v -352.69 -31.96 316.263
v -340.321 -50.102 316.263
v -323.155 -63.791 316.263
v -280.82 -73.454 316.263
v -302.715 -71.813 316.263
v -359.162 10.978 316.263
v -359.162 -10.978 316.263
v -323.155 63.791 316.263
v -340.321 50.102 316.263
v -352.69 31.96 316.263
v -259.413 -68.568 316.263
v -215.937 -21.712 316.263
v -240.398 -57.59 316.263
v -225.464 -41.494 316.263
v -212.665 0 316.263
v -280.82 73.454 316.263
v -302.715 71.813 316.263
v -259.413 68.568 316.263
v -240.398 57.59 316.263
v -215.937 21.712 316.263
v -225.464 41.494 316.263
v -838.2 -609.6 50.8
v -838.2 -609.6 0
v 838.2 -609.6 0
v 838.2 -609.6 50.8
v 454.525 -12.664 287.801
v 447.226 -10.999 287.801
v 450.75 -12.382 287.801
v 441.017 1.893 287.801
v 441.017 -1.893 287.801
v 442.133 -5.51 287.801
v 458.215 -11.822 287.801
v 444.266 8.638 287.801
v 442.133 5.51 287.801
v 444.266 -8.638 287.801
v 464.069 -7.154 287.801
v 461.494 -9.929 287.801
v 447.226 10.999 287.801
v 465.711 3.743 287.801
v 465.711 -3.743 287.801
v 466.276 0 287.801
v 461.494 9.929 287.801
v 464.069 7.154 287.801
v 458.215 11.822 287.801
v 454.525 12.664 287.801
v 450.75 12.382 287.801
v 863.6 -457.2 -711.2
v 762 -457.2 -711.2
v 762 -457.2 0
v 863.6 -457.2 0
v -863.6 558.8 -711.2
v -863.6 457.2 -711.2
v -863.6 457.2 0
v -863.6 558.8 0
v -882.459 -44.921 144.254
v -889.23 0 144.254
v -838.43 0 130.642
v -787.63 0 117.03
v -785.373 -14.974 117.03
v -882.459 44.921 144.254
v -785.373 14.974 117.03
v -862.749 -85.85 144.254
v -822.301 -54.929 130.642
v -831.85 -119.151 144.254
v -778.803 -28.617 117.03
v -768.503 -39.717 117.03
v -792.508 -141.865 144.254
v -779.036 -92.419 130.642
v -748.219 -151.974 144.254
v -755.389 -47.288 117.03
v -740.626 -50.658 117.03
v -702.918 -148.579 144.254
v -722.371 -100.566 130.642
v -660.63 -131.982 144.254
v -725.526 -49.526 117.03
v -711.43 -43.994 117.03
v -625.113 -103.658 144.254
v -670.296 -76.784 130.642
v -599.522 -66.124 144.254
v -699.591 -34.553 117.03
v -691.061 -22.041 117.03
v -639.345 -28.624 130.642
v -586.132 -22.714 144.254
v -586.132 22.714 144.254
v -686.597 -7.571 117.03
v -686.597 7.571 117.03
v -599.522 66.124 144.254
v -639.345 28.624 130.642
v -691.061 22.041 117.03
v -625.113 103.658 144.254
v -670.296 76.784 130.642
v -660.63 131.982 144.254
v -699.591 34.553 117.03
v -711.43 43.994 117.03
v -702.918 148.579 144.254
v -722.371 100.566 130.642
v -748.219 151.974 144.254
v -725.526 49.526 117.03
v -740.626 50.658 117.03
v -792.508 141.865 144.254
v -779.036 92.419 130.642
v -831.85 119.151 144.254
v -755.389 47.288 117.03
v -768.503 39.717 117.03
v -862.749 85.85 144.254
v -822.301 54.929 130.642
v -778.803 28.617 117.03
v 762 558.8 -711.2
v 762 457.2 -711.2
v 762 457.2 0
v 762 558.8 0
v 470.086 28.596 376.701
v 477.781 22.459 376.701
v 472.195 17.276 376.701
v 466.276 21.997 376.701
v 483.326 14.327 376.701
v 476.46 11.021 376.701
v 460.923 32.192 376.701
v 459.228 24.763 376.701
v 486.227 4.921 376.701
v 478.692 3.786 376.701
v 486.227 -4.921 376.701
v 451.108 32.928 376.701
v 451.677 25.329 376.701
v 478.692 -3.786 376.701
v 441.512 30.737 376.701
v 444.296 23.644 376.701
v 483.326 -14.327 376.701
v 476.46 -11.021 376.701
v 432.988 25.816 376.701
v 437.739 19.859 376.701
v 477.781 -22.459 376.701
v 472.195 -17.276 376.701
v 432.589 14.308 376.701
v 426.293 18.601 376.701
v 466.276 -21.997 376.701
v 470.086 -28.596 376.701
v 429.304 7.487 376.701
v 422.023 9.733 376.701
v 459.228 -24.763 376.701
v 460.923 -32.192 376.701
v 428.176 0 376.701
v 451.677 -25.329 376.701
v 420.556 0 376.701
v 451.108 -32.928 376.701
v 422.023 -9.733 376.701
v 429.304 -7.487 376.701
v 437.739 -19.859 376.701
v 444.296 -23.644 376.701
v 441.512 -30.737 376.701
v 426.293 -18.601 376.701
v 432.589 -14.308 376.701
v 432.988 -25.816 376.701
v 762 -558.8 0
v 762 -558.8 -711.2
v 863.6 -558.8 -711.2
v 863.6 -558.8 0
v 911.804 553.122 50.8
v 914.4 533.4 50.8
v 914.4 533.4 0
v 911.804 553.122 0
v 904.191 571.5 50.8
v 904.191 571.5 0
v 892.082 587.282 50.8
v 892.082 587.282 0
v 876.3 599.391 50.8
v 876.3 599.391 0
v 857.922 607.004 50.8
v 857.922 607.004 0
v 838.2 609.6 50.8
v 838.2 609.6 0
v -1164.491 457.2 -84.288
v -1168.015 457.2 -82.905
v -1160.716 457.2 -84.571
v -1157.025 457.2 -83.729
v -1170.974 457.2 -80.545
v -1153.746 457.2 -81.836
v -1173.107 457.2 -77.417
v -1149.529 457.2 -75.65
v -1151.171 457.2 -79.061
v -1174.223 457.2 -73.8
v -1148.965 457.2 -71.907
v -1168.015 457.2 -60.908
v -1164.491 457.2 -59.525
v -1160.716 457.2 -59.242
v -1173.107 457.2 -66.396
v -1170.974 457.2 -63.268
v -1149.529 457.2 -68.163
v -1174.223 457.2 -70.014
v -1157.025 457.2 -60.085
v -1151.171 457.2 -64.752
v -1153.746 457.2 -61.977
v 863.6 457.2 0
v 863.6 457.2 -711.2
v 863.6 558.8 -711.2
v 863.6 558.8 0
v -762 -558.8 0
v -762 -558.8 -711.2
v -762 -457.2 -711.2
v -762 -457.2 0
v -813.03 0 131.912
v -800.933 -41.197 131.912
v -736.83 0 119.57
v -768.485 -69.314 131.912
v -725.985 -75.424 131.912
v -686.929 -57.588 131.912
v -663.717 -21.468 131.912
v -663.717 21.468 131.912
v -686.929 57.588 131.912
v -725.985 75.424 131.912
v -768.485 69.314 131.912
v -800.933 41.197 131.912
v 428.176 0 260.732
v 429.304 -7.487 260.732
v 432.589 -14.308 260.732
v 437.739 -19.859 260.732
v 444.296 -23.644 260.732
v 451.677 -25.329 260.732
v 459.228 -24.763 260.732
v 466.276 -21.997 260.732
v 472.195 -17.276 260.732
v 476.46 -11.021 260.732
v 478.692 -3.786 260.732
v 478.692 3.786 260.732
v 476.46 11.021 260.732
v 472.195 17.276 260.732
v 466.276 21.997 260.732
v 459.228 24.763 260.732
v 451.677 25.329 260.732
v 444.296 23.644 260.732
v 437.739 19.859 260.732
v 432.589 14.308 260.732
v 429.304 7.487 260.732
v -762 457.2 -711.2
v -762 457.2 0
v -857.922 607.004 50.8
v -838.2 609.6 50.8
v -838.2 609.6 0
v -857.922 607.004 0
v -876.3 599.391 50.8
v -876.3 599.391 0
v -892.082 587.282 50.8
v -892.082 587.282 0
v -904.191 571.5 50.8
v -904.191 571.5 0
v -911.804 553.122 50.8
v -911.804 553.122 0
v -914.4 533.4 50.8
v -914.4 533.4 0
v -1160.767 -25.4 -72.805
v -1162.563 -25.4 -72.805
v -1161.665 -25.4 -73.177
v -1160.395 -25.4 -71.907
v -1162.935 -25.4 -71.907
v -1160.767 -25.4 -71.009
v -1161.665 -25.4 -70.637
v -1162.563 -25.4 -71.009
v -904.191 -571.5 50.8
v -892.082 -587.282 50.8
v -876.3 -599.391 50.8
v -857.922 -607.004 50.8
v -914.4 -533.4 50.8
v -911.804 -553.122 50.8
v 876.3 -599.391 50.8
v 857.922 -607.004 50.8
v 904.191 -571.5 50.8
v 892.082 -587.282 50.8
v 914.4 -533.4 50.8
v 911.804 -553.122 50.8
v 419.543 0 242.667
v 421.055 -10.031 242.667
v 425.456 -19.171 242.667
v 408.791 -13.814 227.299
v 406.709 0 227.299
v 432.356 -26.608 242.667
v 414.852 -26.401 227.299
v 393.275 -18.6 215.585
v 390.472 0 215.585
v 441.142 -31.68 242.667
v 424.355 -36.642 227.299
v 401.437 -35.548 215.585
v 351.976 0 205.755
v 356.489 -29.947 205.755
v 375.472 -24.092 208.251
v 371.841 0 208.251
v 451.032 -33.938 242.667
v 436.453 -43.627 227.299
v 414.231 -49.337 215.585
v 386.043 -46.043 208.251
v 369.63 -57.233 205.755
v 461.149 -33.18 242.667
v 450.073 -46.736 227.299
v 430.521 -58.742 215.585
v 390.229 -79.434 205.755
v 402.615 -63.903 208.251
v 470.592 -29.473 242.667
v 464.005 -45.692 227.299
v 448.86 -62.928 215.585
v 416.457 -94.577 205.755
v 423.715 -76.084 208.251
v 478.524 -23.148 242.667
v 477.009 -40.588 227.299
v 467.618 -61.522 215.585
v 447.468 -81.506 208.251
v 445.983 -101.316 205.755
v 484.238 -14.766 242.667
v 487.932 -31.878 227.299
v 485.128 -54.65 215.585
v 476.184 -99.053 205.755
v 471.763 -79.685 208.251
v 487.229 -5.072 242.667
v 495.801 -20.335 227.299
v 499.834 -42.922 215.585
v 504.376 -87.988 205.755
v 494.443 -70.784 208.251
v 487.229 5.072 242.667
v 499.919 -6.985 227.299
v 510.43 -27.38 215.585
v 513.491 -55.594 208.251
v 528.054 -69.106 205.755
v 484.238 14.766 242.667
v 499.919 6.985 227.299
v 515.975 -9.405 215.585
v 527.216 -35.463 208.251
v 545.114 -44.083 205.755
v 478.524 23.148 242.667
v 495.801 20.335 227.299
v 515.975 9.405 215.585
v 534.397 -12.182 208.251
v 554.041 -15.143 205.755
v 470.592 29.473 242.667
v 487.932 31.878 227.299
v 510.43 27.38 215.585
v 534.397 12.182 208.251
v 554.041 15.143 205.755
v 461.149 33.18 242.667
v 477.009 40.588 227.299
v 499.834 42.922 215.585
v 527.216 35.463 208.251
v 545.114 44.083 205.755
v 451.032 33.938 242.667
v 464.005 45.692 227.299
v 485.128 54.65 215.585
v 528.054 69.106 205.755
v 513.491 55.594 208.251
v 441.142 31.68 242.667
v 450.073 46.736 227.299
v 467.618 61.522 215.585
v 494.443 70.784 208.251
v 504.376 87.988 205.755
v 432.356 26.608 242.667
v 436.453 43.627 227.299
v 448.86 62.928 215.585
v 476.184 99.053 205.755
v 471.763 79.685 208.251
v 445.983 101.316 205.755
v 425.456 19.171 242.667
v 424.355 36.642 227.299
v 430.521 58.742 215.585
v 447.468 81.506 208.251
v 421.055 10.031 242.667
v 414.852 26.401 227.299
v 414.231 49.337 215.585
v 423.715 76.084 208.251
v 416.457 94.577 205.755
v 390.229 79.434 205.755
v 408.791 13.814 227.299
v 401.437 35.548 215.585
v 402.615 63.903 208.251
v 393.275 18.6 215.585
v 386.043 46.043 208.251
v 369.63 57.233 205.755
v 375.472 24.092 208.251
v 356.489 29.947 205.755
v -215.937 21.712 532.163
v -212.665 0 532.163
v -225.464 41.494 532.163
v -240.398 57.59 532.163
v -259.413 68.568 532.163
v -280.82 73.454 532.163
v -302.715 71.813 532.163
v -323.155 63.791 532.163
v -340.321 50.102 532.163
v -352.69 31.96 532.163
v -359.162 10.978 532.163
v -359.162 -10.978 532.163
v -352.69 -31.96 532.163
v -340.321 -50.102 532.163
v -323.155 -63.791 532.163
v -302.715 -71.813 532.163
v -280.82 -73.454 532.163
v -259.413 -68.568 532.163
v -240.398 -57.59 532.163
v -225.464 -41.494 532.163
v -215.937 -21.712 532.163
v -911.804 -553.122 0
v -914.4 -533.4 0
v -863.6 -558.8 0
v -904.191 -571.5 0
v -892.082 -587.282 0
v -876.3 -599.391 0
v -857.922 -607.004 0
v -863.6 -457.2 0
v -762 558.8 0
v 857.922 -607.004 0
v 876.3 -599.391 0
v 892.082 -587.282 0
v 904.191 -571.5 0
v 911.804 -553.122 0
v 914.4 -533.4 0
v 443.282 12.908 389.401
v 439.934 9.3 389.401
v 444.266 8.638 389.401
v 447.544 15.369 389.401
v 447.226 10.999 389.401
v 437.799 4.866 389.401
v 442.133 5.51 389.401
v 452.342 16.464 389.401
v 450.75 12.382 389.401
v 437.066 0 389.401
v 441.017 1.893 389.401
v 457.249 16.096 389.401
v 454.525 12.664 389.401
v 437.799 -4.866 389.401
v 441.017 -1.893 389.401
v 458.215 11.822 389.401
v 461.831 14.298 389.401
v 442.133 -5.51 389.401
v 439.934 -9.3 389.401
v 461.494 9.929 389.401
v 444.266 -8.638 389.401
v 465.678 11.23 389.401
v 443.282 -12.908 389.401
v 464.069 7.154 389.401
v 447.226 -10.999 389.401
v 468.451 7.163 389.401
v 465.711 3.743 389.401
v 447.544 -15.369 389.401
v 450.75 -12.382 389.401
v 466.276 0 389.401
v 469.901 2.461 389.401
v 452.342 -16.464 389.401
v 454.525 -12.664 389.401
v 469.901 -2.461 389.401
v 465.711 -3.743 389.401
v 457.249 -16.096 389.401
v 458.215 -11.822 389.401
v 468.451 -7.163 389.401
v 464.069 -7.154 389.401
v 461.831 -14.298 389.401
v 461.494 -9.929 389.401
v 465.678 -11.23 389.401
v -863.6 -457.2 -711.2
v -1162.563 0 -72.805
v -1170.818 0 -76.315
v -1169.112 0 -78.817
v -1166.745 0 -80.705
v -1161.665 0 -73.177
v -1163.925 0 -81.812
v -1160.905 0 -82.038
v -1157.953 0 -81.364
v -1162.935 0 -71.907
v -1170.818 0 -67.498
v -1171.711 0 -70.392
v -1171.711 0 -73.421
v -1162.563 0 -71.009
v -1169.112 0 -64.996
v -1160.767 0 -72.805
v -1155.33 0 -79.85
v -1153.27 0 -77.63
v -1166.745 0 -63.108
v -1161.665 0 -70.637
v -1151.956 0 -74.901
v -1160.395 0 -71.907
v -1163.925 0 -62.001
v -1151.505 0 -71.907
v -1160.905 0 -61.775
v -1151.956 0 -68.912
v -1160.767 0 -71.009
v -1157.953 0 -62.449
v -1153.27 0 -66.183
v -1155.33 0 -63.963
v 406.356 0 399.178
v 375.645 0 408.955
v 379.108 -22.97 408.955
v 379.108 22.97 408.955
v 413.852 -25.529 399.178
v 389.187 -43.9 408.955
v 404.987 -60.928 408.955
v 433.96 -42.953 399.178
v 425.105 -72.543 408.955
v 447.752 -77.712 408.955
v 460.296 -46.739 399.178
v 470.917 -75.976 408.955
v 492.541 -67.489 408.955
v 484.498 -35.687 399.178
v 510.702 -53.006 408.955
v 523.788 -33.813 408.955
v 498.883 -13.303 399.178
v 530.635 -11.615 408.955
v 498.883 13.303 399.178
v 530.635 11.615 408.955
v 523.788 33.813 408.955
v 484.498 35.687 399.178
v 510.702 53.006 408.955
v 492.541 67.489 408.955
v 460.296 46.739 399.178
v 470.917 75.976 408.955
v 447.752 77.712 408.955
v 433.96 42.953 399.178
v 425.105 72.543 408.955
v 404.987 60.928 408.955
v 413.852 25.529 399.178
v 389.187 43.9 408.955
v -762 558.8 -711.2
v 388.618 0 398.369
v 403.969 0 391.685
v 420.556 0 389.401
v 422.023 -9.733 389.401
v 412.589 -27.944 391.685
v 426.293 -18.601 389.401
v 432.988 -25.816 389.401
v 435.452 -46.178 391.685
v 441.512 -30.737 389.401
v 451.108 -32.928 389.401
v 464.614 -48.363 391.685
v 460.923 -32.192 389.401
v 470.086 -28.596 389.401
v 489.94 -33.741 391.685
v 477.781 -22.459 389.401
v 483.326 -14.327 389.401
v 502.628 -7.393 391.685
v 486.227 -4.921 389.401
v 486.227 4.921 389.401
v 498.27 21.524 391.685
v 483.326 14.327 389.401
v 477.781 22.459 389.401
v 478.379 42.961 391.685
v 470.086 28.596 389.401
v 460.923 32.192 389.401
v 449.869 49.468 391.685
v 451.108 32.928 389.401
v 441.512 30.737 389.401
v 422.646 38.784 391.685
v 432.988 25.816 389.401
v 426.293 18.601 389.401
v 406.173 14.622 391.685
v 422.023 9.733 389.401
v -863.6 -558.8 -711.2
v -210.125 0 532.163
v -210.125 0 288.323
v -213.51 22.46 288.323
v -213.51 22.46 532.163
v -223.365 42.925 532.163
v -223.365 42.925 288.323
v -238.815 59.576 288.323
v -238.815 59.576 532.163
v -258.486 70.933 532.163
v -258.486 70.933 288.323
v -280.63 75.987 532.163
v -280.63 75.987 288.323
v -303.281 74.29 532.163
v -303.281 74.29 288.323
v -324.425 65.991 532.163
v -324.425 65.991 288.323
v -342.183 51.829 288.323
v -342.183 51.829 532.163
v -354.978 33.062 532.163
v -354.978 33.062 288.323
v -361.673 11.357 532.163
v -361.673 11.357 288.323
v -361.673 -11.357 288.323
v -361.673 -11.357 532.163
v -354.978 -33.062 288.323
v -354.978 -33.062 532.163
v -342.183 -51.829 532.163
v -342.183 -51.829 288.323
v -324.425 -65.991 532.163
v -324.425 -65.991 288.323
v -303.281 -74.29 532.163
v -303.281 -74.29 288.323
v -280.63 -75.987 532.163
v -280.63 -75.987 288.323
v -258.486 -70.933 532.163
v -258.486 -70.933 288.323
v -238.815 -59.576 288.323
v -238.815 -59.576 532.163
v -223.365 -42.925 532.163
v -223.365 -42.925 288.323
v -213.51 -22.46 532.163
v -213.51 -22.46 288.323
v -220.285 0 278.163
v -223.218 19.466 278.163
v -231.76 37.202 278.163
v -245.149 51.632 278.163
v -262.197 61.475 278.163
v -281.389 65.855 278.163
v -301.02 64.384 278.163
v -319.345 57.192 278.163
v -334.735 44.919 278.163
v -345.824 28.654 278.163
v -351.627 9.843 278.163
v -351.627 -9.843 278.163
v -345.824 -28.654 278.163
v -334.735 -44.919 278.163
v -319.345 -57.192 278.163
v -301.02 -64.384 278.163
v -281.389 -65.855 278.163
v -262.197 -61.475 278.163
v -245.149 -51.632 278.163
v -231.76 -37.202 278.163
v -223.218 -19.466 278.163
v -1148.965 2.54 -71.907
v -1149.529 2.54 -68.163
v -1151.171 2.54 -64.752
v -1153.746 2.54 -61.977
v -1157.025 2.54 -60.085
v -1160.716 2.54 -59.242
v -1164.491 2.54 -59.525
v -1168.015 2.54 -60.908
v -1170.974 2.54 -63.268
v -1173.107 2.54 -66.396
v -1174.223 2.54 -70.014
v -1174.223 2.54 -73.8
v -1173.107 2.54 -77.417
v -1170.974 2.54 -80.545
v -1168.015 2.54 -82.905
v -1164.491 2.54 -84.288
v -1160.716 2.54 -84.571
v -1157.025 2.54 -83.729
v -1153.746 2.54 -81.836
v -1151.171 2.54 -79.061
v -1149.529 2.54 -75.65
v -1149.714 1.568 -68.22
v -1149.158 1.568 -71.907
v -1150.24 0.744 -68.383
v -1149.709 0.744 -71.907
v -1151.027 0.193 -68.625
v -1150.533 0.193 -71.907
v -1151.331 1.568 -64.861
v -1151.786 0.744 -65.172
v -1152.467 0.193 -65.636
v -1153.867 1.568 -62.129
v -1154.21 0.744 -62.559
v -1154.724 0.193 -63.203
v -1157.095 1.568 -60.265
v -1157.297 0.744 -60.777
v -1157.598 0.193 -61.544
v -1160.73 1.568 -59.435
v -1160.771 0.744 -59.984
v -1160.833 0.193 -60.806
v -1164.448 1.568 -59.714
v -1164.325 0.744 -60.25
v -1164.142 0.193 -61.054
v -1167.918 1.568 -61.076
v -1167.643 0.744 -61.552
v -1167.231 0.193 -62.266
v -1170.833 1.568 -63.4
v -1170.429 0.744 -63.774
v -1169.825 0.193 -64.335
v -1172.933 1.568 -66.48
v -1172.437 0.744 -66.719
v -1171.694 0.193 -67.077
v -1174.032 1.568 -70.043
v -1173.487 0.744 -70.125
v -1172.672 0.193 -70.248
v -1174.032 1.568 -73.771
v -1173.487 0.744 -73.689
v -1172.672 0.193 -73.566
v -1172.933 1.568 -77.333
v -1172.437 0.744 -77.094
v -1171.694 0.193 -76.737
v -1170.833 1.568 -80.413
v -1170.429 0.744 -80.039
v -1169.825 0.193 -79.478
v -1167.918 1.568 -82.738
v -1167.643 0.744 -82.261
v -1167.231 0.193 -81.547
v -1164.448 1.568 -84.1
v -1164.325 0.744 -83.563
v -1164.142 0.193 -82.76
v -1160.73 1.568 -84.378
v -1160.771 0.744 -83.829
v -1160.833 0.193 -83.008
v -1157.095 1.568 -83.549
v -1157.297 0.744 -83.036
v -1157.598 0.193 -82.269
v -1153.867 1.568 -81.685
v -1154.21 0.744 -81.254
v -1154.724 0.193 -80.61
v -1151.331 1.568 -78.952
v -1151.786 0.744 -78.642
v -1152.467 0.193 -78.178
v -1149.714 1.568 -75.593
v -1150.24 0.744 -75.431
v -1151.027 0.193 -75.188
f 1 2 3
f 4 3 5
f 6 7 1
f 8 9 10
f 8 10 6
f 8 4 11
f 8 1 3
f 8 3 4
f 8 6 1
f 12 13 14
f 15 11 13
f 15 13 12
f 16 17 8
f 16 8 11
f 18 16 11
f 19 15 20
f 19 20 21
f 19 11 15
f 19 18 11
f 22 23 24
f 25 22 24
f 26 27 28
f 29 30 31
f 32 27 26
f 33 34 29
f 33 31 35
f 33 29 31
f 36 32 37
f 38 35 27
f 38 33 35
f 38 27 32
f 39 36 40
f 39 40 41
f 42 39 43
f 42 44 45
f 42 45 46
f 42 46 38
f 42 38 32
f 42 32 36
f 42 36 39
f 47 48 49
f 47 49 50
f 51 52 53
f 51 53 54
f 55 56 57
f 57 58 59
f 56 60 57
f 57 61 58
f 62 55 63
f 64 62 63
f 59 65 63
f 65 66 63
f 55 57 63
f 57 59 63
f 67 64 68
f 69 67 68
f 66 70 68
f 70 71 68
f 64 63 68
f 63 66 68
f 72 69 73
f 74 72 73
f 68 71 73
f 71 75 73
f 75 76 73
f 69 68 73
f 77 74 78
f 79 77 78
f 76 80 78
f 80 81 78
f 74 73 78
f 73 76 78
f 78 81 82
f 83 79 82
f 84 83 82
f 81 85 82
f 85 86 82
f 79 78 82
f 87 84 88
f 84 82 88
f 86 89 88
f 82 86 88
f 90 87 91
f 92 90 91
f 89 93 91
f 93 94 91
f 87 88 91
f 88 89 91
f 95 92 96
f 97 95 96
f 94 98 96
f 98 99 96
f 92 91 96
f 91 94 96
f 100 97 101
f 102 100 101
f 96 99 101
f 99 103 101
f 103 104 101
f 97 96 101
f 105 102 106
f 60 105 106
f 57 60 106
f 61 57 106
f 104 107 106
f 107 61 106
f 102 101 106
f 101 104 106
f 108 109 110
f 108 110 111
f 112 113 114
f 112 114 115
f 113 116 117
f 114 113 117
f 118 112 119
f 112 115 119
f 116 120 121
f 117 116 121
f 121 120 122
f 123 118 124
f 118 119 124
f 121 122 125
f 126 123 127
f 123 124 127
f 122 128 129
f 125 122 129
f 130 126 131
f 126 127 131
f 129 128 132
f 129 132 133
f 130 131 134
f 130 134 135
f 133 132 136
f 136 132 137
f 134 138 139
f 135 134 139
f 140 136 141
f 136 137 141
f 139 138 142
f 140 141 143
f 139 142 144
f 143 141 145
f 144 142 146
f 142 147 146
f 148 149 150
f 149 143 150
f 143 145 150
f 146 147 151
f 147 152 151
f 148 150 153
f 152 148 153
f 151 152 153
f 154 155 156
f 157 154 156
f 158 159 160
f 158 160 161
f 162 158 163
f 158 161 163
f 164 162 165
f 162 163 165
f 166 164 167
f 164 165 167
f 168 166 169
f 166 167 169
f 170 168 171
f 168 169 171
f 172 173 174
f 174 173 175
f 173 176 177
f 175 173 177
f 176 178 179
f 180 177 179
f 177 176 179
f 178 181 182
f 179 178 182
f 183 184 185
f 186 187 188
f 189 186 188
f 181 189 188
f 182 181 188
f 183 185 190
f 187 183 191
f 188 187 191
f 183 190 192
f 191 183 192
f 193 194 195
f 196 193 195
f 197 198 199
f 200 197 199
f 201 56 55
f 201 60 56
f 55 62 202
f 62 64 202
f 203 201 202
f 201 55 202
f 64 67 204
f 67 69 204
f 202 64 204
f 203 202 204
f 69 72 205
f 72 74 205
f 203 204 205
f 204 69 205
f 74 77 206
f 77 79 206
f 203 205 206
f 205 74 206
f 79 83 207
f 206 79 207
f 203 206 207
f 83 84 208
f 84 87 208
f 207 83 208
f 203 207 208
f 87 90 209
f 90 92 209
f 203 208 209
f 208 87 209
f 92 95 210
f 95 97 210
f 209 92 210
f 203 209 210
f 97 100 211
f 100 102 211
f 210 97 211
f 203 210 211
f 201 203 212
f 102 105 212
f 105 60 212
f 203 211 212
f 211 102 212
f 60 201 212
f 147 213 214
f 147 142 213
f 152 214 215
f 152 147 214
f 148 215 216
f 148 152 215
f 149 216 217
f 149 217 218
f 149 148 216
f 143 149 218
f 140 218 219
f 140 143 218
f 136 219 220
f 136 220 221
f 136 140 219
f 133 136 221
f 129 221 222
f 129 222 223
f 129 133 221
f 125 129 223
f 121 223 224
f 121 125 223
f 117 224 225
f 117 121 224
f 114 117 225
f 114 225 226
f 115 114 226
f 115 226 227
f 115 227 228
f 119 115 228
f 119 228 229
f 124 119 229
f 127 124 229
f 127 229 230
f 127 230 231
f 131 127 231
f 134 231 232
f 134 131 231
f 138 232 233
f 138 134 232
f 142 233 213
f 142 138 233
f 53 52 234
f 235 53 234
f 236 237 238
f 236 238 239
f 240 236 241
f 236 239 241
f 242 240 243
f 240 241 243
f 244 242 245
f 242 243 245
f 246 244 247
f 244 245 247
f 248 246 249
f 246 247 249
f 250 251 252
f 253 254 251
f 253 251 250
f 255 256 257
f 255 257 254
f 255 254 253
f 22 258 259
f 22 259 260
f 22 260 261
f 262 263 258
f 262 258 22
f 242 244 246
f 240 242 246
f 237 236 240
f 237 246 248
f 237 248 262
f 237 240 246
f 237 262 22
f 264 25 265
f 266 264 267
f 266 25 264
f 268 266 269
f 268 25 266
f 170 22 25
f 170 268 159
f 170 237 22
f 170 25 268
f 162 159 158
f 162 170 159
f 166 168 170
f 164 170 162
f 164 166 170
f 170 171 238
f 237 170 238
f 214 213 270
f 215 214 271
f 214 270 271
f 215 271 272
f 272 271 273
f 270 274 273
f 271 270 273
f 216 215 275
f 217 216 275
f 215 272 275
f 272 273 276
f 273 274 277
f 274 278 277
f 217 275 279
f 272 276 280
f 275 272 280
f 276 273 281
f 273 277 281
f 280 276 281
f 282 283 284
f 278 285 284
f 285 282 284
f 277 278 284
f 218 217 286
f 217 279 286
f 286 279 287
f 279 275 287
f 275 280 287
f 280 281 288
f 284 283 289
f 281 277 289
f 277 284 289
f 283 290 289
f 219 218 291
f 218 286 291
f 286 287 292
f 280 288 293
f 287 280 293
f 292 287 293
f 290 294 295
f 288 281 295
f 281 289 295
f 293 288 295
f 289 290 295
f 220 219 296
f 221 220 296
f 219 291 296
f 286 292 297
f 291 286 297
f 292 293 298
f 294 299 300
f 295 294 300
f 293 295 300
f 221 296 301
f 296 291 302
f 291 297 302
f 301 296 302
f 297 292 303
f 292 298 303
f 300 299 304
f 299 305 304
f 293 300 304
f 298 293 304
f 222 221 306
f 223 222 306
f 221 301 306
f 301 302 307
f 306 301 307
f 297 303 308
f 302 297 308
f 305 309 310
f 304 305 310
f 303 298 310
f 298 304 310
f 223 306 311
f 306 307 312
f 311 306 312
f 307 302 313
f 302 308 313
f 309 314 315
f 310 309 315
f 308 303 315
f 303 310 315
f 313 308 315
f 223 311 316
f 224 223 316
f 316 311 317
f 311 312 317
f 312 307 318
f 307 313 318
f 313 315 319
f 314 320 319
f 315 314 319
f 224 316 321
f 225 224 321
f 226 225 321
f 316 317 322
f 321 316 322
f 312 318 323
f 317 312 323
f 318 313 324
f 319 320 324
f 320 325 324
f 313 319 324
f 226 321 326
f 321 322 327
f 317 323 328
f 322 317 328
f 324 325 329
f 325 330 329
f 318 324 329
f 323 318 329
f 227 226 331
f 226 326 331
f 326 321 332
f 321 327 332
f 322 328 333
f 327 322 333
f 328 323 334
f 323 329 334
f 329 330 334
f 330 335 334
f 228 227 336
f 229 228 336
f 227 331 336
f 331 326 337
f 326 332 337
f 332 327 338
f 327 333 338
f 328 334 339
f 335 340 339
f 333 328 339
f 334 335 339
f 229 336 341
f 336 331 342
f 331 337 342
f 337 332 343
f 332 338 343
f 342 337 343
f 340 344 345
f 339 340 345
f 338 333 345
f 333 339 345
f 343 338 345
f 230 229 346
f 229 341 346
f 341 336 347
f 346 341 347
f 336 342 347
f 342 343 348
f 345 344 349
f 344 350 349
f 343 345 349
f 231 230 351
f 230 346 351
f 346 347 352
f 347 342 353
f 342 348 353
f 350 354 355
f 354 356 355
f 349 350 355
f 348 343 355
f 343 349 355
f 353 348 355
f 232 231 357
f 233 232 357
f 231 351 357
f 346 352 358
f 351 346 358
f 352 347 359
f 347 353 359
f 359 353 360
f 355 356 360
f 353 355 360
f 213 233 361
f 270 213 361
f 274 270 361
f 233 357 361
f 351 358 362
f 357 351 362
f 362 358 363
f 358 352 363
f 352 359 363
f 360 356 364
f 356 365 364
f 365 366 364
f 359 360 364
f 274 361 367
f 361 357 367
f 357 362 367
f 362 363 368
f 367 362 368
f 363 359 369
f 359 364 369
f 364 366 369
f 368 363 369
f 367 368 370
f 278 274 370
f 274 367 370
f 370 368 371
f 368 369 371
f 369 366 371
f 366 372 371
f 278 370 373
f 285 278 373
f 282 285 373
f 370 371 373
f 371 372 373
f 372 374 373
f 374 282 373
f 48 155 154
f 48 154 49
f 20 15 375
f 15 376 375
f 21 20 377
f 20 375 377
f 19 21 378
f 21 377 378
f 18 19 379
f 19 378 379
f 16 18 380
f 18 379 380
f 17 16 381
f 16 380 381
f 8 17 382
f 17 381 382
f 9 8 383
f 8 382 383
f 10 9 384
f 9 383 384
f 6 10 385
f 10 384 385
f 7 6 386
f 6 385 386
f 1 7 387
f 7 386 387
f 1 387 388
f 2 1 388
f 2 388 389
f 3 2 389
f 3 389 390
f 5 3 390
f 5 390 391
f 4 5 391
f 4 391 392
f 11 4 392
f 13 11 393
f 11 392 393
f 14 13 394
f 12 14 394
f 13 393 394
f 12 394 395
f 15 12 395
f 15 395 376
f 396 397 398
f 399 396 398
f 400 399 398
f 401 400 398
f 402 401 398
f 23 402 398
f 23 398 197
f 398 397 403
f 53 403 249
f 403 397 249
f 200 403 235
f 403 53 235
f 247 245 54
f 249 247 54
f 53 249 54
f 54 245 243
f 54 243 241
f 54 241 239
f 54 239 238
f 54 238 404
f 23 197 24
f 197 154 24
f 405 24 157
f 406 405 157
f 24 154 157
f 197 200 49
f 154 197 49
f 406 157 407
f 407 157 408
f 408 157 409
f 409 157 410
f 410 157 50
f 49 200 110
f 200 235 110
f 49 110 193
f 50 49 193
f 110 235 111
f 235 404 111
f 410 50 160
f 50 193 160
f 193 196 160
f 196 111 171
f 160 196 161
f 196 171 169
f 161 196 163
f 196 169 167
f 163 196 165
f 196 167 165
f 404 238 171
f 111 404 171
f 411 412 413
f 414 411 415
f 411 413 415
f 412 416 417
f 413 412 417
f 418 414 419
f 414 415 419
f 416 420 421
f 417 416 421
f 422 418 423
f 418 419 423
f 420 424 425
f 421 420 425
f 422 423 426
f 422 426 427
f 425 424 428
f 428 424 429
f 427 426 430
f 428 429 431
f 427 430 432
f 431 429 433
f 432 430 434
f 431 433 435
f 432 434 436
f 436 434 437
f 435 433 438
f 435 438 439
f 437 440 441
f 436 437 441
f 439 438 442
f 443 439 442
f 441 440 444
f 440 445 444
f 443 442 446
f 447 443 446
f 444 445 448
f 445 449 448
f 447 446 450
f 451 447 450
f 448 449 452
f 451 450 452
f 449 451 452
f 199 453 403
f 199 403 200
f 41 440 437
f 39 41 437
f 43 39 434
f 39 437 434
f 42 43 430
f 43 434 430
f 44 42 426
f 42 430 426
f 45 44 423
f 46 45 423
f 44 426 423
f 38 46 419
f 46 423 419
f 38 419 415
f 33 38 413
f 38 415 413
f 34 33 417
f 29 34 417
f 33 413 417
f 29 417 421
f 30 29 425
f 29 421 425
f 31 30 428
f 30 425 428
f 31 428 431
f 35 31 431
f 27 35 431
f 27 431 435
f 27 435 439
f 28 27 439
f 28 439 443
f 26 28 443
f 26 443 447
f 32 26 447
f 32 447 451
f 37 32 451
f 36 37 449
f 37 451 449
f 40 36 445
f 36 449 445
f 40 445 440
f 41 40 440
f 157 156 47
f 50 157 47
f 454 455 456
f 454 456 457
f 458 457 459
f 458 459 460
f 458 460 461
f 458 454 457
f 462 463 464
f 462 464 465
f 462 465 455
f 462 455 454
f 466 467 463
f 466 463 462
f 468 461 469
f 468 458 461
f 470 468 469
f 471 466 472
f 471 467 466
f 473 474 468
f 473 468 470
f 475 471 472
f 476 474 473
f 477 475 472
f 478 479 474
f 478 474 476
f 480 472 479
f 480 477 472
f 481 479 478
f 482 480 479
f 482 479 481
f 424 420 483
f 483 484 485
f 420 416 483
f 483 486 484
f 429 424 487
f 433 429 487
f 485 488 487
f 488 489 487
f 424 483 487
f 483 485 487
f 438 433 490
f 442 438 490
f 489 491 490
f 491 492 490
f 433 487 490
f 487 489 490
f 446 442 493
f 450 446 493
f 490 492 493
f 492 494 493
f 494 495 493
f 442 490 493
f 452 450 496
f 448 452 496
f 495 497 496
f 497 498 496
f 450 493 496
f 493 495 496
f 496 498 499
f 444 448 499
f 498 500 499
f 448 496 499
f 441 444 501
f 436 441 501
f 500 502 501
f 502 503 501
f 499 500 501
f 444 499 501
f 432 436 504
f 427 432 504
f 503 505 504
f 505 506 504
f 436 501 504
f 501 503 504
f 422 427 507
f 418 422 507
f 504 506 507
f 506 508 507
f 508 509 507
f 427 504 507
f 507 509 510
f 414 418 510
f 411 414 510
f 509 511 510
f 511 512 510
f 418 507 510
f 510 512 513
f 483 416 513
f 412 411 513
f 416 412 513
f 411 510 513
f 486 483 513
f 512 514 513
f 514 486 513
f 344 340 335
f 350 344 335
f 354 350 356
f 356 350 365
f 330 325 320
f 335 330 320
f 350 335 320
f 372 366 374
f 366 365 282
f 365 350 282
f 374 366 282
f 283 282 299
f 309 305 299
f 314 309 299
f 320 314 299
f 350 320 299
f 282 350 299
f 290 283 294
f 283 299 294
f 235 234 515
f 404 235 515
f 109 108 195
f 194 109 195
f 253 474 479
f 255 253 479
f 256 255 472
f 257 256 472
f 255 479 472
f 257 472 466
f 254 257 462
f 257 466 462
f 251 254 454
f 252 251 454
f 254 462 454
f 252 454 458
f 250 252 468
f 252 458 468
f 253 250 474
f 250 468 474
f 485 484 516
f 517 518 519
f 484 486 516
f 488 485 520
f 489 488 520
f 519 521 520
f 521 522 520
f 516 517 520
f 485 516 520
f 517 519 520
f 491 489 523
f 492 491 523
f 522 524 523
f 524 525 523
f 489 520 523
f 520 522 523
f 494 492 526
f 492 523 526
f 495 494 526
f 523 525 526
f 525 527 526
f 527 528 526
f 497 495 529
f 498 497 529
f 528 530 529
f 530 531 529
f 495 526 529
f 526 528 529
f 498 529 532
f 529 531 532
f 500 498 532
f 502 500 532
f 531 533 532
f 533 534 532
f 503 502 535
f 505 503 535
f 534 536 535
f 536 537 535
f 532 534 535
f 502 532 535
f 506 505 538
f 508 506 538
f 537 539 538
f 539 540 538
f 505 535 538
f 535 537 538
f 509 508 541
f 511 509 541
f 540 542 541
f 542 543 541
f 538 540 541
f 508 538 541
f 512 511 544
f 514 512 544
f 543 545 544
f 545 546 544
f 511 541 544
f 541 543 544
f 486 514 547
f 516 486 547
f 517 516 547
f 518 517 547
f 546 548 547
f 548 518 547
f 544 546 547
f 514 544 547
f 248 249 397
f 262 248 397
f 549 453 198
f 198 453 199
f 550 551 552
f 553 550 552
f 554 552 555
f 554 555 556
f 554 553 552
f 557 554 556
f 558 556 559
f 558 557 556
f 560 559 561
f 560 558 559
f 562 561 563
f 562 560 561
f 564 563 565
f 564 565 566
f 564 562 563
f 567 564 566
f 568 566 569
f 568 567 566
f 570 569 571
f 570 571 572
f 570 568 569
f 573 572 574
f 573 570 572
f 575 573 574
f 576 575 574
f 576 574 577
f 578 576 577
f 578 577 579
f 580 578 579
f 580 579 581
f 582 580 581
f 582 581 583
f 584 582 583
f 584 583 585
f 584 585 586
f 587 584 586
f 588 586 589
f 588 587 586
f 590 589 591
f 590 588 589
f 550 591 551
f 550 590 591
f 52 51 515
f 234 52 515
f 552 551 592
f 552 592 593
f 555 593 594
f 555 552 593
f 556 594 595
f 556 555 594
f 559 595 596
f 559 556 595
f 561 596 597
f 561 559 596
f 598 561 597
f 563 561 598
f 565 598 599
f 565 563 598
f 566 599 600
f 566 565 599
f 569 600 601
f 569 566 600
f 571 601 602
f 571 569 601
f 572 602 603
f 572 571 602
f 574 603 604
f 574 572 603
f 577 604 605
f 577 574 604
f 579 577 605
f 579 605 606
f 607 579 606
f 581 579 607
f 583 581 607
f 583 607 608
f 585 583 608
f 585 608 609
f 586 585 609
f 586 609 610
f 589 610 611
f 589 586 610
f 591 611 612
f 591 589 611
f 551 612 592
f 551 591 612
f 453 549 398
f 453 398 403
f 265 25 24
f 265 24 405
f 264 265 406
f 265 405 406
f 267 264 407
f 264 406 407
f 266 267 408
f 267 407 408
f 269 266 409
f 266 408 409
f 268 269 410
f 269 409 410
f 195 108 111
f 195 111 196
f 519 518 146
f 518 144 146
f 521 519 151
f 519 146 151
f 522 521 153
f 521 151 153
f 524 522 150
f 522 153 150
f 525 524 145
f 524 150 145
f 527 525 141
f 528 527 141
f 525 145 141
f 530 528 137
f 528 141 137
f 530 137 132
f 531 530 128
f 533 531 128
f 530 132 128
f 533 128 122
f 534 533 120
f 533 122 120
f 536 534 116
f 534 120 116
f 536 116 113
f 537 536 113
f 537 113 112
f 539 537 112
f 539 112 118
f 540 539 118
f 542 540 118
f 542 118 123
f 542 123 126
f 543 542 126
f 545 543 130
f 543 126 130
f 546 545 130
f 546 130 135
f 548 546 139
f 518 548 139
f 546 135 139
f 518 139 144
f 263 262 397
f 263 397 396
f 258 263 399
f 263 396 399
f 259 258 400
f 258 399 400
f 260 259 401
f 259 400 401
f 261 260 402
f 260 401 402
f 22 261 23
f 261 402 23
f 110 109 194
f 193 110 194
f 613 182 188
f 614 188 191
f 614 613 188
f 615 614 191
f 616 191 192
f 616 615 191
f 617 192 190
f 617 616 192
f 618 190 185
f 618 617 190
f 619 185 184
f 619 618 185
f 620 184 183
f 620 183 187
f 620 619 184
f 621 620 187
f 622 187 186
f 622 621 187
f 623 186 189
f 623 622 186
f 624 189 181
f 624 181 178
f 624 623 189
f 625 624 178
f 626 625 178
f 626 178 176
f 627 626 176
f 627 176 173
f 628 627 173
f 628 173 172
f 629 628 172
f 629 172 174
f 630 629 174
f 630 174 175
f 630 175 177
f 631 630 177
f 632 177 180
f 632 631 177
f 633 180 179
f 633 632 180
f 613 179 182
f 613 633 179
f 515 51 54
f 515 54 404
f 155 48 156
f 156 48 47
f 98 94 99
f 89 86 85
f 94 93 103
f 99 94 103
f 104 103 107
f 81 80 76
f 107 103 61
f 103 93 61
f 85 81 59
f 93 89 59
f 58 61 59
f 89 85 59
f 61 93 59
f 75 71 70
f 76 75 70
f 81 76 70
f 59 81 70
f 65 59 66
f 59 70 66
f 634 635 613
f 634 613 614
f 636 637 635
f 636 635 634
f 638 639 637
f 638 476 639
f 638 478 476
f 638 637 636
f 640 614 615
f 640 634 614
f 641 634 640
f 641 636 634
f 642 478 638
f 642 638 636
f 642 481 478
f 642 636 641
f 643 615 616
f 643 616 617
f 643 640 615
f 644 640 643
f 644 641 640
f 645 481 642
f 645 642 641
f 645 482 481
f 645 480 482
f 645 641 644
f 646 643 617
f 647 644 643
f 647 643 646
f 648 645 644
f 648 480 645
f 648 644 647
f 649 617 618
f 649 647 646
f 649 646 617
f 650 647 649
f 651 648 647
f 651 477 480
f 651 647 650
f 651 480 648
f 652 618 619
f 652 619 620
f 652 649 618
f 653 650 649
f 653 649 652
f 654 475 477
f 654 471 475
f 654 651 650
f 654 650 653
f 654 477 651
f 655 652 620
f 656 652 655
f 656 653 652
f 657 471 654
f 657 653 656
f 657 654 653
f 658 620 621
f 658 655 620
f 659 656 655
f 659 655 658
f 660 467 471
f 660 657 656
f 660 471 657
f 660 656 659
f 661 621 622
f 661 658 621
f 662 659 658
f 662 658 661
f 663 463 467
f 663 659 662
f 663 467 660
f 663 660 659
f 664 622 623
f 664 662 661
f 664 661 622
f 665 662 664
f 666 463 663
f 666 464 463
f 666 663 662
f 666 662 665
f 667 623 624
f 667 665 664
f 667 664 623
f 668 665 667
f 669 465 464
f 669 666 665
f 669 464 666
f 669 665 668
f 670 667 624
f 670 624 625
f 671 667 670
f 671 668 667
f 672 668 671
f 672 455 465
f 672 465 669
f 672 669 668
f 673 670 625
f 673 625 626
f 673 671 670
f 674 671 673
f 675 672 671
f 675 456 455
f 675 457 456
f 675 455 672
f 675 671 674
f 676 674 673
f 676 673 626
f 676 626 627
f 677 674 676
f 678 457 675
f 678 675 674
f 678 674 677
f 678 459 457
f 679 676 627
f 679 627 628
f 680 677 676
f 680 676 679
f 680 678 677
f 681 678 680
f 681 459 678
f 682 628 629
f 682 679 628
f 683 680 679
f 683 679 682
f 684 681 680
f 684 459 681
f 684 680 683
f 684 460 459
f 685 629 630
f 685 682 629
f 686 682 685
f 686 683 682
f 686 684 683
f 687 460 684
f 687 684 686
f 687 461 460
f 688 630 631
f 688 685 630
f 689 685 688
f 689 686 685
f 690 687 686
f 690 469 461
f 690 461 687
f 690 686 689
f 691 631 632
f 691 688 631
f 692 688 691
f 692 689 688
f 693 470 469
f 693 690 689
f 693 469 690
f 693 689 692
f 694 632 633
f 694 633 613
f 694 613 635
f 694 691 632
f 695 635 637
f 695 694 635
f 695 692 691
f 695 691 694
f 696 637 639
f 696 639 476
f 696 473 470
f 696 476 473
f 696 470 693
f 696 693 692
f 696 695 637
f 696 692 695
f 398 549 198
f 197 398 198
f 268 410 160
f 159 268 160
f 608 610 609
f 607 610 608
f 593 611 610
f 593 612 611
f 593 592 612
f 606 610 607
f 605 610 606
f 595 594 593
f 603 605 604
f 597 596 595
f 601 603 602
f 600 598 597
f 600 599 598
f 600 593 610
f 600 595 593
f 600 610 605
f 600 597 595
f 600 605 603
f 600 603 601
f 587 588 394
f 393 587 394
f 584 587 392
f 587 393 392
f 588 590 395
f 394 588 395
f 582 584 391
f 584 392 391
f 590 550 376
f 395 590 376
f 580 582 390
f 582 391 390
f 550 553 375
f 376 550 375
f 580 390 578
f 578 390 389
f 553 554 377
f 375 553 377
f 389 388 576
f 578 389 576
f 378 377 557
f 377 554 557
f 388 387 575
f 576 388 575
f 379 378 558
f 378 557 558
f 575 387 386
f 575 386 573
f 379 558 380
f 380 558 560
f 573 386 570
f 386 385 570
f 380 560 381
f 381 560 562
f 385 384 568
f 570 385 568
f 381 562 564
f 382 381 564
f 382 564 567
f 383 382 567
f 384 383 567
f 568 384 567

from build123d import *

# Parameters (mm, degrees)
F0_W      = 101.6
F0_H      = 101.6
F1_DEPTH  = 50.8
F2_DEPTH  = 711.2
F3_W      = 2.54
F3_H      = 215.9
F5_SIZE   = 10.16
F8_R      = 12.7
F8_R_2    = 1.27
F9_DEPTH  = 457.2
F10_DEPTH = 25.4
F11_R     = 2.54
F12_W     = 25.4
F12_H     = 115.9687861614
F14_R     = 12.7
F15_DEPTH = 101.6


with BuildPart() as f1:
    # F0 (on Top) → F1 (new body)
    with BuildSketch(Plane.XY):
        with BuildLine():
            Line((838.2, 609.6), (-838.2, 609.6))
            ThreePointArc((-838.2, 609.6), (-892.0815367264, 587.2815367264), (-914.4, 533.4))
            Line((-914.4, 533.4), (-914.4, -533.4))
            ThreePointArc((-914.4, -533.4), (-892.0815367264, -587.2815367264), (-838.2, -609.6))
            Line((-838.2, -609.6), (838.2, -609.6))
            ThreePointArc((838.2, -609.6), (892.0815367264, -587.2815367264), (914.4, -533.4))
            Line((914.4, -533.4), (914.4, 533.4))
            ThreePointArc((914.4, 533.4), (892.0815367264, 587.2815367264), (838.2, 609.6))
        make_face()
        with Locations((-812.8, -508)):
            Rectangle(F0_W, F0_H, mode=Mode.SUBTRACT)
        with Locations((812.8, -508)):
            Rectangle(F0_W, F0_H, mode=Mode.SUBTRACT)
        with Locations((-812.8, 508)):
            Rectangle(F0_W, F0_H, mode=Mode.SUBTRACT)
        with Locations((812.8, 508)):
            Rectangle(F0_W, F0_H, mode=Mode.SUBTRACT)
        with Locations((-812.8, -508)):
            Rectangle(F0_W, F0_H)
        with Locations((812.8, -508)):
            Rectangle(F0_W, F0_H)
        with Locations((812.8, 508)):
            Rectangle(F0_W, F0_H)
        with Locations((-812.8, 508)):
            Rectangle(F0_W, F0_H)
    extrude(amount=F1_DEPTH)

    # F0 (on Top) → F2 (join)
    with BuildSketch(Plane.XY):
        with Locations((-812.8, -508)):
            Rectangle(F0_W, F0_H)
        with Locations((-812.8, 508)):
            Rectangle(F0_W, F0_H)
        with Locations((812.8, 508)):
            Rectangle(F0_W, F0_H)
        with Locations((812.8, -508)):
            Rectangle(F0_W, F0_H)
    extrude(amount=-F2_DEPTH)


with BuildPart() as f4:
    # F3 (on Front) → F4 (revolve)
    with BuildSketch(Plane.XZ):
        Polygon((-286.3245010376, 316.2632285118), (-286.3245010376, 278.1632285118), (-210.1245010376, 278.1632285118), (-210.1245010376, 316.2632285118), (-212.6645010376, 316.2632285118), align=None)
        with Locations((-211.3945010376, 424.2132285118)):
            Rectangle(F3_W, F3_H)
    revolve(axis=Axis((-286.3245010376, 0, 405.1632285118), (0, 0, 1)))

    # F5
    f5_edges = [f4.edges().sort_by_distance(p)[0] for p in [
        (-362.524501, 0, 278.163229),
    ]]
    chamfer(f5_edges, length=F5_SIZE)


with BuildPart() as f7:
    # F6 (on Front) → F7 (revolve)
    with BuildSketch(Plane.XZ):
        Polygon((-787.6298852921, 117.0304474873), (-736.8298852921, 117.0304474873), (-736.8298852921, 119.5704474873), (-889.2298852921, 144.2540854383), align=None)
    revolve(axis=Axis((-736.8298852921, 0, 187.9355122422), (0, 0, 1)))


with BuildPart() as f9:
    # F8 (on Front) → F9 (new body)
    with BuildSketch(Plane.XZ):
        with Locations((-1161.6646051407, -71.9066634774)):
            Circle(F8_R)
        with Locations((-1161.6646051407, -71.9066634774)):
            Circle(F8_R_2, mode=Mode.SUBTRACT)
        with Locations((-1161.6646051407, -71.9066634774)):
            Circle(F8_R_2)
    extrude(amount=-F9_DEPTH)

    # F8 (on Front) → F10 (join)
    with BuildSketch(Plane.XZ):
        with Locations((-1161.6646051407, -71.9066634774)):
            Circle(F8_R_2)
    extrude(amount=F10_DEPTH)

    # F11
    f11_edges = [f9.edges().sort_by_distance(p)[0] for p in [
        (-1174.364605, 0, -71.906663),
    ]]
    fillet(f11_edges, radius=F11_R)


with BuildPart() as f13:
    # F12 (on Front) → F13 (revolve)
    with BuildSketch(Plane.XZ):
        Polygon((428.1756336873, 376.7006152139), (453.5756336873, 376.7006152139), (453.5756336873, 389.4006152139), (437.0656336873, 389.4006152139), (420.5556336873, 389.4006152139), (420.5556336873, 376.7006152139), align=None)
        with Locations((440.8756336873, 318.7162221332)):
            Rectangle(F12_W, F12_H)
        with BuildLine():
            Line((351.9756336873, 205.7550829578), (453.5756336873, 205.7550829578))
            Line((453.5756336873, 205.7550829578), (453.5756336873, 260.7318290524))
            Line((453.5756336873, 260.7318290524), (428.1756336873, 260.7318290524))
            ThreePointArc((428.1756336873, 260.7318290524), (398.9567006482, 220.9339369722), (351.9756336873, 205.7550829578))
        make_face()
        with BuildLine():
            Line((420.5556336873, 389.4006152139), (437.0656336873, 389.4006152139))
            Line((437.0656336873, 389.4006152139), (375.645477209, 408.9550829578))
            ThreePointArc((375.645477209, 408.9550829578), (396.0643119403, 394.5012700165), (420.5556336873, 389.4006152139))
        make_face()
    revolve(axis=Axis((453.5756336873, 0, 307.3550829578), (0, 0, 1)))

    # F14 (on face) → F15 (cut)
    with BuildSketch(Plane.XY.offset(389.4006152139)):
        with Locations((453.5756336873, 0)):
            Circle(F14_R)
    extrude(amount=-F15_DEPTH, mode=Mode.SUBTRACT)


solid = Compound([f1.part, f4.part, f7.part, f9.part, f13.part])
